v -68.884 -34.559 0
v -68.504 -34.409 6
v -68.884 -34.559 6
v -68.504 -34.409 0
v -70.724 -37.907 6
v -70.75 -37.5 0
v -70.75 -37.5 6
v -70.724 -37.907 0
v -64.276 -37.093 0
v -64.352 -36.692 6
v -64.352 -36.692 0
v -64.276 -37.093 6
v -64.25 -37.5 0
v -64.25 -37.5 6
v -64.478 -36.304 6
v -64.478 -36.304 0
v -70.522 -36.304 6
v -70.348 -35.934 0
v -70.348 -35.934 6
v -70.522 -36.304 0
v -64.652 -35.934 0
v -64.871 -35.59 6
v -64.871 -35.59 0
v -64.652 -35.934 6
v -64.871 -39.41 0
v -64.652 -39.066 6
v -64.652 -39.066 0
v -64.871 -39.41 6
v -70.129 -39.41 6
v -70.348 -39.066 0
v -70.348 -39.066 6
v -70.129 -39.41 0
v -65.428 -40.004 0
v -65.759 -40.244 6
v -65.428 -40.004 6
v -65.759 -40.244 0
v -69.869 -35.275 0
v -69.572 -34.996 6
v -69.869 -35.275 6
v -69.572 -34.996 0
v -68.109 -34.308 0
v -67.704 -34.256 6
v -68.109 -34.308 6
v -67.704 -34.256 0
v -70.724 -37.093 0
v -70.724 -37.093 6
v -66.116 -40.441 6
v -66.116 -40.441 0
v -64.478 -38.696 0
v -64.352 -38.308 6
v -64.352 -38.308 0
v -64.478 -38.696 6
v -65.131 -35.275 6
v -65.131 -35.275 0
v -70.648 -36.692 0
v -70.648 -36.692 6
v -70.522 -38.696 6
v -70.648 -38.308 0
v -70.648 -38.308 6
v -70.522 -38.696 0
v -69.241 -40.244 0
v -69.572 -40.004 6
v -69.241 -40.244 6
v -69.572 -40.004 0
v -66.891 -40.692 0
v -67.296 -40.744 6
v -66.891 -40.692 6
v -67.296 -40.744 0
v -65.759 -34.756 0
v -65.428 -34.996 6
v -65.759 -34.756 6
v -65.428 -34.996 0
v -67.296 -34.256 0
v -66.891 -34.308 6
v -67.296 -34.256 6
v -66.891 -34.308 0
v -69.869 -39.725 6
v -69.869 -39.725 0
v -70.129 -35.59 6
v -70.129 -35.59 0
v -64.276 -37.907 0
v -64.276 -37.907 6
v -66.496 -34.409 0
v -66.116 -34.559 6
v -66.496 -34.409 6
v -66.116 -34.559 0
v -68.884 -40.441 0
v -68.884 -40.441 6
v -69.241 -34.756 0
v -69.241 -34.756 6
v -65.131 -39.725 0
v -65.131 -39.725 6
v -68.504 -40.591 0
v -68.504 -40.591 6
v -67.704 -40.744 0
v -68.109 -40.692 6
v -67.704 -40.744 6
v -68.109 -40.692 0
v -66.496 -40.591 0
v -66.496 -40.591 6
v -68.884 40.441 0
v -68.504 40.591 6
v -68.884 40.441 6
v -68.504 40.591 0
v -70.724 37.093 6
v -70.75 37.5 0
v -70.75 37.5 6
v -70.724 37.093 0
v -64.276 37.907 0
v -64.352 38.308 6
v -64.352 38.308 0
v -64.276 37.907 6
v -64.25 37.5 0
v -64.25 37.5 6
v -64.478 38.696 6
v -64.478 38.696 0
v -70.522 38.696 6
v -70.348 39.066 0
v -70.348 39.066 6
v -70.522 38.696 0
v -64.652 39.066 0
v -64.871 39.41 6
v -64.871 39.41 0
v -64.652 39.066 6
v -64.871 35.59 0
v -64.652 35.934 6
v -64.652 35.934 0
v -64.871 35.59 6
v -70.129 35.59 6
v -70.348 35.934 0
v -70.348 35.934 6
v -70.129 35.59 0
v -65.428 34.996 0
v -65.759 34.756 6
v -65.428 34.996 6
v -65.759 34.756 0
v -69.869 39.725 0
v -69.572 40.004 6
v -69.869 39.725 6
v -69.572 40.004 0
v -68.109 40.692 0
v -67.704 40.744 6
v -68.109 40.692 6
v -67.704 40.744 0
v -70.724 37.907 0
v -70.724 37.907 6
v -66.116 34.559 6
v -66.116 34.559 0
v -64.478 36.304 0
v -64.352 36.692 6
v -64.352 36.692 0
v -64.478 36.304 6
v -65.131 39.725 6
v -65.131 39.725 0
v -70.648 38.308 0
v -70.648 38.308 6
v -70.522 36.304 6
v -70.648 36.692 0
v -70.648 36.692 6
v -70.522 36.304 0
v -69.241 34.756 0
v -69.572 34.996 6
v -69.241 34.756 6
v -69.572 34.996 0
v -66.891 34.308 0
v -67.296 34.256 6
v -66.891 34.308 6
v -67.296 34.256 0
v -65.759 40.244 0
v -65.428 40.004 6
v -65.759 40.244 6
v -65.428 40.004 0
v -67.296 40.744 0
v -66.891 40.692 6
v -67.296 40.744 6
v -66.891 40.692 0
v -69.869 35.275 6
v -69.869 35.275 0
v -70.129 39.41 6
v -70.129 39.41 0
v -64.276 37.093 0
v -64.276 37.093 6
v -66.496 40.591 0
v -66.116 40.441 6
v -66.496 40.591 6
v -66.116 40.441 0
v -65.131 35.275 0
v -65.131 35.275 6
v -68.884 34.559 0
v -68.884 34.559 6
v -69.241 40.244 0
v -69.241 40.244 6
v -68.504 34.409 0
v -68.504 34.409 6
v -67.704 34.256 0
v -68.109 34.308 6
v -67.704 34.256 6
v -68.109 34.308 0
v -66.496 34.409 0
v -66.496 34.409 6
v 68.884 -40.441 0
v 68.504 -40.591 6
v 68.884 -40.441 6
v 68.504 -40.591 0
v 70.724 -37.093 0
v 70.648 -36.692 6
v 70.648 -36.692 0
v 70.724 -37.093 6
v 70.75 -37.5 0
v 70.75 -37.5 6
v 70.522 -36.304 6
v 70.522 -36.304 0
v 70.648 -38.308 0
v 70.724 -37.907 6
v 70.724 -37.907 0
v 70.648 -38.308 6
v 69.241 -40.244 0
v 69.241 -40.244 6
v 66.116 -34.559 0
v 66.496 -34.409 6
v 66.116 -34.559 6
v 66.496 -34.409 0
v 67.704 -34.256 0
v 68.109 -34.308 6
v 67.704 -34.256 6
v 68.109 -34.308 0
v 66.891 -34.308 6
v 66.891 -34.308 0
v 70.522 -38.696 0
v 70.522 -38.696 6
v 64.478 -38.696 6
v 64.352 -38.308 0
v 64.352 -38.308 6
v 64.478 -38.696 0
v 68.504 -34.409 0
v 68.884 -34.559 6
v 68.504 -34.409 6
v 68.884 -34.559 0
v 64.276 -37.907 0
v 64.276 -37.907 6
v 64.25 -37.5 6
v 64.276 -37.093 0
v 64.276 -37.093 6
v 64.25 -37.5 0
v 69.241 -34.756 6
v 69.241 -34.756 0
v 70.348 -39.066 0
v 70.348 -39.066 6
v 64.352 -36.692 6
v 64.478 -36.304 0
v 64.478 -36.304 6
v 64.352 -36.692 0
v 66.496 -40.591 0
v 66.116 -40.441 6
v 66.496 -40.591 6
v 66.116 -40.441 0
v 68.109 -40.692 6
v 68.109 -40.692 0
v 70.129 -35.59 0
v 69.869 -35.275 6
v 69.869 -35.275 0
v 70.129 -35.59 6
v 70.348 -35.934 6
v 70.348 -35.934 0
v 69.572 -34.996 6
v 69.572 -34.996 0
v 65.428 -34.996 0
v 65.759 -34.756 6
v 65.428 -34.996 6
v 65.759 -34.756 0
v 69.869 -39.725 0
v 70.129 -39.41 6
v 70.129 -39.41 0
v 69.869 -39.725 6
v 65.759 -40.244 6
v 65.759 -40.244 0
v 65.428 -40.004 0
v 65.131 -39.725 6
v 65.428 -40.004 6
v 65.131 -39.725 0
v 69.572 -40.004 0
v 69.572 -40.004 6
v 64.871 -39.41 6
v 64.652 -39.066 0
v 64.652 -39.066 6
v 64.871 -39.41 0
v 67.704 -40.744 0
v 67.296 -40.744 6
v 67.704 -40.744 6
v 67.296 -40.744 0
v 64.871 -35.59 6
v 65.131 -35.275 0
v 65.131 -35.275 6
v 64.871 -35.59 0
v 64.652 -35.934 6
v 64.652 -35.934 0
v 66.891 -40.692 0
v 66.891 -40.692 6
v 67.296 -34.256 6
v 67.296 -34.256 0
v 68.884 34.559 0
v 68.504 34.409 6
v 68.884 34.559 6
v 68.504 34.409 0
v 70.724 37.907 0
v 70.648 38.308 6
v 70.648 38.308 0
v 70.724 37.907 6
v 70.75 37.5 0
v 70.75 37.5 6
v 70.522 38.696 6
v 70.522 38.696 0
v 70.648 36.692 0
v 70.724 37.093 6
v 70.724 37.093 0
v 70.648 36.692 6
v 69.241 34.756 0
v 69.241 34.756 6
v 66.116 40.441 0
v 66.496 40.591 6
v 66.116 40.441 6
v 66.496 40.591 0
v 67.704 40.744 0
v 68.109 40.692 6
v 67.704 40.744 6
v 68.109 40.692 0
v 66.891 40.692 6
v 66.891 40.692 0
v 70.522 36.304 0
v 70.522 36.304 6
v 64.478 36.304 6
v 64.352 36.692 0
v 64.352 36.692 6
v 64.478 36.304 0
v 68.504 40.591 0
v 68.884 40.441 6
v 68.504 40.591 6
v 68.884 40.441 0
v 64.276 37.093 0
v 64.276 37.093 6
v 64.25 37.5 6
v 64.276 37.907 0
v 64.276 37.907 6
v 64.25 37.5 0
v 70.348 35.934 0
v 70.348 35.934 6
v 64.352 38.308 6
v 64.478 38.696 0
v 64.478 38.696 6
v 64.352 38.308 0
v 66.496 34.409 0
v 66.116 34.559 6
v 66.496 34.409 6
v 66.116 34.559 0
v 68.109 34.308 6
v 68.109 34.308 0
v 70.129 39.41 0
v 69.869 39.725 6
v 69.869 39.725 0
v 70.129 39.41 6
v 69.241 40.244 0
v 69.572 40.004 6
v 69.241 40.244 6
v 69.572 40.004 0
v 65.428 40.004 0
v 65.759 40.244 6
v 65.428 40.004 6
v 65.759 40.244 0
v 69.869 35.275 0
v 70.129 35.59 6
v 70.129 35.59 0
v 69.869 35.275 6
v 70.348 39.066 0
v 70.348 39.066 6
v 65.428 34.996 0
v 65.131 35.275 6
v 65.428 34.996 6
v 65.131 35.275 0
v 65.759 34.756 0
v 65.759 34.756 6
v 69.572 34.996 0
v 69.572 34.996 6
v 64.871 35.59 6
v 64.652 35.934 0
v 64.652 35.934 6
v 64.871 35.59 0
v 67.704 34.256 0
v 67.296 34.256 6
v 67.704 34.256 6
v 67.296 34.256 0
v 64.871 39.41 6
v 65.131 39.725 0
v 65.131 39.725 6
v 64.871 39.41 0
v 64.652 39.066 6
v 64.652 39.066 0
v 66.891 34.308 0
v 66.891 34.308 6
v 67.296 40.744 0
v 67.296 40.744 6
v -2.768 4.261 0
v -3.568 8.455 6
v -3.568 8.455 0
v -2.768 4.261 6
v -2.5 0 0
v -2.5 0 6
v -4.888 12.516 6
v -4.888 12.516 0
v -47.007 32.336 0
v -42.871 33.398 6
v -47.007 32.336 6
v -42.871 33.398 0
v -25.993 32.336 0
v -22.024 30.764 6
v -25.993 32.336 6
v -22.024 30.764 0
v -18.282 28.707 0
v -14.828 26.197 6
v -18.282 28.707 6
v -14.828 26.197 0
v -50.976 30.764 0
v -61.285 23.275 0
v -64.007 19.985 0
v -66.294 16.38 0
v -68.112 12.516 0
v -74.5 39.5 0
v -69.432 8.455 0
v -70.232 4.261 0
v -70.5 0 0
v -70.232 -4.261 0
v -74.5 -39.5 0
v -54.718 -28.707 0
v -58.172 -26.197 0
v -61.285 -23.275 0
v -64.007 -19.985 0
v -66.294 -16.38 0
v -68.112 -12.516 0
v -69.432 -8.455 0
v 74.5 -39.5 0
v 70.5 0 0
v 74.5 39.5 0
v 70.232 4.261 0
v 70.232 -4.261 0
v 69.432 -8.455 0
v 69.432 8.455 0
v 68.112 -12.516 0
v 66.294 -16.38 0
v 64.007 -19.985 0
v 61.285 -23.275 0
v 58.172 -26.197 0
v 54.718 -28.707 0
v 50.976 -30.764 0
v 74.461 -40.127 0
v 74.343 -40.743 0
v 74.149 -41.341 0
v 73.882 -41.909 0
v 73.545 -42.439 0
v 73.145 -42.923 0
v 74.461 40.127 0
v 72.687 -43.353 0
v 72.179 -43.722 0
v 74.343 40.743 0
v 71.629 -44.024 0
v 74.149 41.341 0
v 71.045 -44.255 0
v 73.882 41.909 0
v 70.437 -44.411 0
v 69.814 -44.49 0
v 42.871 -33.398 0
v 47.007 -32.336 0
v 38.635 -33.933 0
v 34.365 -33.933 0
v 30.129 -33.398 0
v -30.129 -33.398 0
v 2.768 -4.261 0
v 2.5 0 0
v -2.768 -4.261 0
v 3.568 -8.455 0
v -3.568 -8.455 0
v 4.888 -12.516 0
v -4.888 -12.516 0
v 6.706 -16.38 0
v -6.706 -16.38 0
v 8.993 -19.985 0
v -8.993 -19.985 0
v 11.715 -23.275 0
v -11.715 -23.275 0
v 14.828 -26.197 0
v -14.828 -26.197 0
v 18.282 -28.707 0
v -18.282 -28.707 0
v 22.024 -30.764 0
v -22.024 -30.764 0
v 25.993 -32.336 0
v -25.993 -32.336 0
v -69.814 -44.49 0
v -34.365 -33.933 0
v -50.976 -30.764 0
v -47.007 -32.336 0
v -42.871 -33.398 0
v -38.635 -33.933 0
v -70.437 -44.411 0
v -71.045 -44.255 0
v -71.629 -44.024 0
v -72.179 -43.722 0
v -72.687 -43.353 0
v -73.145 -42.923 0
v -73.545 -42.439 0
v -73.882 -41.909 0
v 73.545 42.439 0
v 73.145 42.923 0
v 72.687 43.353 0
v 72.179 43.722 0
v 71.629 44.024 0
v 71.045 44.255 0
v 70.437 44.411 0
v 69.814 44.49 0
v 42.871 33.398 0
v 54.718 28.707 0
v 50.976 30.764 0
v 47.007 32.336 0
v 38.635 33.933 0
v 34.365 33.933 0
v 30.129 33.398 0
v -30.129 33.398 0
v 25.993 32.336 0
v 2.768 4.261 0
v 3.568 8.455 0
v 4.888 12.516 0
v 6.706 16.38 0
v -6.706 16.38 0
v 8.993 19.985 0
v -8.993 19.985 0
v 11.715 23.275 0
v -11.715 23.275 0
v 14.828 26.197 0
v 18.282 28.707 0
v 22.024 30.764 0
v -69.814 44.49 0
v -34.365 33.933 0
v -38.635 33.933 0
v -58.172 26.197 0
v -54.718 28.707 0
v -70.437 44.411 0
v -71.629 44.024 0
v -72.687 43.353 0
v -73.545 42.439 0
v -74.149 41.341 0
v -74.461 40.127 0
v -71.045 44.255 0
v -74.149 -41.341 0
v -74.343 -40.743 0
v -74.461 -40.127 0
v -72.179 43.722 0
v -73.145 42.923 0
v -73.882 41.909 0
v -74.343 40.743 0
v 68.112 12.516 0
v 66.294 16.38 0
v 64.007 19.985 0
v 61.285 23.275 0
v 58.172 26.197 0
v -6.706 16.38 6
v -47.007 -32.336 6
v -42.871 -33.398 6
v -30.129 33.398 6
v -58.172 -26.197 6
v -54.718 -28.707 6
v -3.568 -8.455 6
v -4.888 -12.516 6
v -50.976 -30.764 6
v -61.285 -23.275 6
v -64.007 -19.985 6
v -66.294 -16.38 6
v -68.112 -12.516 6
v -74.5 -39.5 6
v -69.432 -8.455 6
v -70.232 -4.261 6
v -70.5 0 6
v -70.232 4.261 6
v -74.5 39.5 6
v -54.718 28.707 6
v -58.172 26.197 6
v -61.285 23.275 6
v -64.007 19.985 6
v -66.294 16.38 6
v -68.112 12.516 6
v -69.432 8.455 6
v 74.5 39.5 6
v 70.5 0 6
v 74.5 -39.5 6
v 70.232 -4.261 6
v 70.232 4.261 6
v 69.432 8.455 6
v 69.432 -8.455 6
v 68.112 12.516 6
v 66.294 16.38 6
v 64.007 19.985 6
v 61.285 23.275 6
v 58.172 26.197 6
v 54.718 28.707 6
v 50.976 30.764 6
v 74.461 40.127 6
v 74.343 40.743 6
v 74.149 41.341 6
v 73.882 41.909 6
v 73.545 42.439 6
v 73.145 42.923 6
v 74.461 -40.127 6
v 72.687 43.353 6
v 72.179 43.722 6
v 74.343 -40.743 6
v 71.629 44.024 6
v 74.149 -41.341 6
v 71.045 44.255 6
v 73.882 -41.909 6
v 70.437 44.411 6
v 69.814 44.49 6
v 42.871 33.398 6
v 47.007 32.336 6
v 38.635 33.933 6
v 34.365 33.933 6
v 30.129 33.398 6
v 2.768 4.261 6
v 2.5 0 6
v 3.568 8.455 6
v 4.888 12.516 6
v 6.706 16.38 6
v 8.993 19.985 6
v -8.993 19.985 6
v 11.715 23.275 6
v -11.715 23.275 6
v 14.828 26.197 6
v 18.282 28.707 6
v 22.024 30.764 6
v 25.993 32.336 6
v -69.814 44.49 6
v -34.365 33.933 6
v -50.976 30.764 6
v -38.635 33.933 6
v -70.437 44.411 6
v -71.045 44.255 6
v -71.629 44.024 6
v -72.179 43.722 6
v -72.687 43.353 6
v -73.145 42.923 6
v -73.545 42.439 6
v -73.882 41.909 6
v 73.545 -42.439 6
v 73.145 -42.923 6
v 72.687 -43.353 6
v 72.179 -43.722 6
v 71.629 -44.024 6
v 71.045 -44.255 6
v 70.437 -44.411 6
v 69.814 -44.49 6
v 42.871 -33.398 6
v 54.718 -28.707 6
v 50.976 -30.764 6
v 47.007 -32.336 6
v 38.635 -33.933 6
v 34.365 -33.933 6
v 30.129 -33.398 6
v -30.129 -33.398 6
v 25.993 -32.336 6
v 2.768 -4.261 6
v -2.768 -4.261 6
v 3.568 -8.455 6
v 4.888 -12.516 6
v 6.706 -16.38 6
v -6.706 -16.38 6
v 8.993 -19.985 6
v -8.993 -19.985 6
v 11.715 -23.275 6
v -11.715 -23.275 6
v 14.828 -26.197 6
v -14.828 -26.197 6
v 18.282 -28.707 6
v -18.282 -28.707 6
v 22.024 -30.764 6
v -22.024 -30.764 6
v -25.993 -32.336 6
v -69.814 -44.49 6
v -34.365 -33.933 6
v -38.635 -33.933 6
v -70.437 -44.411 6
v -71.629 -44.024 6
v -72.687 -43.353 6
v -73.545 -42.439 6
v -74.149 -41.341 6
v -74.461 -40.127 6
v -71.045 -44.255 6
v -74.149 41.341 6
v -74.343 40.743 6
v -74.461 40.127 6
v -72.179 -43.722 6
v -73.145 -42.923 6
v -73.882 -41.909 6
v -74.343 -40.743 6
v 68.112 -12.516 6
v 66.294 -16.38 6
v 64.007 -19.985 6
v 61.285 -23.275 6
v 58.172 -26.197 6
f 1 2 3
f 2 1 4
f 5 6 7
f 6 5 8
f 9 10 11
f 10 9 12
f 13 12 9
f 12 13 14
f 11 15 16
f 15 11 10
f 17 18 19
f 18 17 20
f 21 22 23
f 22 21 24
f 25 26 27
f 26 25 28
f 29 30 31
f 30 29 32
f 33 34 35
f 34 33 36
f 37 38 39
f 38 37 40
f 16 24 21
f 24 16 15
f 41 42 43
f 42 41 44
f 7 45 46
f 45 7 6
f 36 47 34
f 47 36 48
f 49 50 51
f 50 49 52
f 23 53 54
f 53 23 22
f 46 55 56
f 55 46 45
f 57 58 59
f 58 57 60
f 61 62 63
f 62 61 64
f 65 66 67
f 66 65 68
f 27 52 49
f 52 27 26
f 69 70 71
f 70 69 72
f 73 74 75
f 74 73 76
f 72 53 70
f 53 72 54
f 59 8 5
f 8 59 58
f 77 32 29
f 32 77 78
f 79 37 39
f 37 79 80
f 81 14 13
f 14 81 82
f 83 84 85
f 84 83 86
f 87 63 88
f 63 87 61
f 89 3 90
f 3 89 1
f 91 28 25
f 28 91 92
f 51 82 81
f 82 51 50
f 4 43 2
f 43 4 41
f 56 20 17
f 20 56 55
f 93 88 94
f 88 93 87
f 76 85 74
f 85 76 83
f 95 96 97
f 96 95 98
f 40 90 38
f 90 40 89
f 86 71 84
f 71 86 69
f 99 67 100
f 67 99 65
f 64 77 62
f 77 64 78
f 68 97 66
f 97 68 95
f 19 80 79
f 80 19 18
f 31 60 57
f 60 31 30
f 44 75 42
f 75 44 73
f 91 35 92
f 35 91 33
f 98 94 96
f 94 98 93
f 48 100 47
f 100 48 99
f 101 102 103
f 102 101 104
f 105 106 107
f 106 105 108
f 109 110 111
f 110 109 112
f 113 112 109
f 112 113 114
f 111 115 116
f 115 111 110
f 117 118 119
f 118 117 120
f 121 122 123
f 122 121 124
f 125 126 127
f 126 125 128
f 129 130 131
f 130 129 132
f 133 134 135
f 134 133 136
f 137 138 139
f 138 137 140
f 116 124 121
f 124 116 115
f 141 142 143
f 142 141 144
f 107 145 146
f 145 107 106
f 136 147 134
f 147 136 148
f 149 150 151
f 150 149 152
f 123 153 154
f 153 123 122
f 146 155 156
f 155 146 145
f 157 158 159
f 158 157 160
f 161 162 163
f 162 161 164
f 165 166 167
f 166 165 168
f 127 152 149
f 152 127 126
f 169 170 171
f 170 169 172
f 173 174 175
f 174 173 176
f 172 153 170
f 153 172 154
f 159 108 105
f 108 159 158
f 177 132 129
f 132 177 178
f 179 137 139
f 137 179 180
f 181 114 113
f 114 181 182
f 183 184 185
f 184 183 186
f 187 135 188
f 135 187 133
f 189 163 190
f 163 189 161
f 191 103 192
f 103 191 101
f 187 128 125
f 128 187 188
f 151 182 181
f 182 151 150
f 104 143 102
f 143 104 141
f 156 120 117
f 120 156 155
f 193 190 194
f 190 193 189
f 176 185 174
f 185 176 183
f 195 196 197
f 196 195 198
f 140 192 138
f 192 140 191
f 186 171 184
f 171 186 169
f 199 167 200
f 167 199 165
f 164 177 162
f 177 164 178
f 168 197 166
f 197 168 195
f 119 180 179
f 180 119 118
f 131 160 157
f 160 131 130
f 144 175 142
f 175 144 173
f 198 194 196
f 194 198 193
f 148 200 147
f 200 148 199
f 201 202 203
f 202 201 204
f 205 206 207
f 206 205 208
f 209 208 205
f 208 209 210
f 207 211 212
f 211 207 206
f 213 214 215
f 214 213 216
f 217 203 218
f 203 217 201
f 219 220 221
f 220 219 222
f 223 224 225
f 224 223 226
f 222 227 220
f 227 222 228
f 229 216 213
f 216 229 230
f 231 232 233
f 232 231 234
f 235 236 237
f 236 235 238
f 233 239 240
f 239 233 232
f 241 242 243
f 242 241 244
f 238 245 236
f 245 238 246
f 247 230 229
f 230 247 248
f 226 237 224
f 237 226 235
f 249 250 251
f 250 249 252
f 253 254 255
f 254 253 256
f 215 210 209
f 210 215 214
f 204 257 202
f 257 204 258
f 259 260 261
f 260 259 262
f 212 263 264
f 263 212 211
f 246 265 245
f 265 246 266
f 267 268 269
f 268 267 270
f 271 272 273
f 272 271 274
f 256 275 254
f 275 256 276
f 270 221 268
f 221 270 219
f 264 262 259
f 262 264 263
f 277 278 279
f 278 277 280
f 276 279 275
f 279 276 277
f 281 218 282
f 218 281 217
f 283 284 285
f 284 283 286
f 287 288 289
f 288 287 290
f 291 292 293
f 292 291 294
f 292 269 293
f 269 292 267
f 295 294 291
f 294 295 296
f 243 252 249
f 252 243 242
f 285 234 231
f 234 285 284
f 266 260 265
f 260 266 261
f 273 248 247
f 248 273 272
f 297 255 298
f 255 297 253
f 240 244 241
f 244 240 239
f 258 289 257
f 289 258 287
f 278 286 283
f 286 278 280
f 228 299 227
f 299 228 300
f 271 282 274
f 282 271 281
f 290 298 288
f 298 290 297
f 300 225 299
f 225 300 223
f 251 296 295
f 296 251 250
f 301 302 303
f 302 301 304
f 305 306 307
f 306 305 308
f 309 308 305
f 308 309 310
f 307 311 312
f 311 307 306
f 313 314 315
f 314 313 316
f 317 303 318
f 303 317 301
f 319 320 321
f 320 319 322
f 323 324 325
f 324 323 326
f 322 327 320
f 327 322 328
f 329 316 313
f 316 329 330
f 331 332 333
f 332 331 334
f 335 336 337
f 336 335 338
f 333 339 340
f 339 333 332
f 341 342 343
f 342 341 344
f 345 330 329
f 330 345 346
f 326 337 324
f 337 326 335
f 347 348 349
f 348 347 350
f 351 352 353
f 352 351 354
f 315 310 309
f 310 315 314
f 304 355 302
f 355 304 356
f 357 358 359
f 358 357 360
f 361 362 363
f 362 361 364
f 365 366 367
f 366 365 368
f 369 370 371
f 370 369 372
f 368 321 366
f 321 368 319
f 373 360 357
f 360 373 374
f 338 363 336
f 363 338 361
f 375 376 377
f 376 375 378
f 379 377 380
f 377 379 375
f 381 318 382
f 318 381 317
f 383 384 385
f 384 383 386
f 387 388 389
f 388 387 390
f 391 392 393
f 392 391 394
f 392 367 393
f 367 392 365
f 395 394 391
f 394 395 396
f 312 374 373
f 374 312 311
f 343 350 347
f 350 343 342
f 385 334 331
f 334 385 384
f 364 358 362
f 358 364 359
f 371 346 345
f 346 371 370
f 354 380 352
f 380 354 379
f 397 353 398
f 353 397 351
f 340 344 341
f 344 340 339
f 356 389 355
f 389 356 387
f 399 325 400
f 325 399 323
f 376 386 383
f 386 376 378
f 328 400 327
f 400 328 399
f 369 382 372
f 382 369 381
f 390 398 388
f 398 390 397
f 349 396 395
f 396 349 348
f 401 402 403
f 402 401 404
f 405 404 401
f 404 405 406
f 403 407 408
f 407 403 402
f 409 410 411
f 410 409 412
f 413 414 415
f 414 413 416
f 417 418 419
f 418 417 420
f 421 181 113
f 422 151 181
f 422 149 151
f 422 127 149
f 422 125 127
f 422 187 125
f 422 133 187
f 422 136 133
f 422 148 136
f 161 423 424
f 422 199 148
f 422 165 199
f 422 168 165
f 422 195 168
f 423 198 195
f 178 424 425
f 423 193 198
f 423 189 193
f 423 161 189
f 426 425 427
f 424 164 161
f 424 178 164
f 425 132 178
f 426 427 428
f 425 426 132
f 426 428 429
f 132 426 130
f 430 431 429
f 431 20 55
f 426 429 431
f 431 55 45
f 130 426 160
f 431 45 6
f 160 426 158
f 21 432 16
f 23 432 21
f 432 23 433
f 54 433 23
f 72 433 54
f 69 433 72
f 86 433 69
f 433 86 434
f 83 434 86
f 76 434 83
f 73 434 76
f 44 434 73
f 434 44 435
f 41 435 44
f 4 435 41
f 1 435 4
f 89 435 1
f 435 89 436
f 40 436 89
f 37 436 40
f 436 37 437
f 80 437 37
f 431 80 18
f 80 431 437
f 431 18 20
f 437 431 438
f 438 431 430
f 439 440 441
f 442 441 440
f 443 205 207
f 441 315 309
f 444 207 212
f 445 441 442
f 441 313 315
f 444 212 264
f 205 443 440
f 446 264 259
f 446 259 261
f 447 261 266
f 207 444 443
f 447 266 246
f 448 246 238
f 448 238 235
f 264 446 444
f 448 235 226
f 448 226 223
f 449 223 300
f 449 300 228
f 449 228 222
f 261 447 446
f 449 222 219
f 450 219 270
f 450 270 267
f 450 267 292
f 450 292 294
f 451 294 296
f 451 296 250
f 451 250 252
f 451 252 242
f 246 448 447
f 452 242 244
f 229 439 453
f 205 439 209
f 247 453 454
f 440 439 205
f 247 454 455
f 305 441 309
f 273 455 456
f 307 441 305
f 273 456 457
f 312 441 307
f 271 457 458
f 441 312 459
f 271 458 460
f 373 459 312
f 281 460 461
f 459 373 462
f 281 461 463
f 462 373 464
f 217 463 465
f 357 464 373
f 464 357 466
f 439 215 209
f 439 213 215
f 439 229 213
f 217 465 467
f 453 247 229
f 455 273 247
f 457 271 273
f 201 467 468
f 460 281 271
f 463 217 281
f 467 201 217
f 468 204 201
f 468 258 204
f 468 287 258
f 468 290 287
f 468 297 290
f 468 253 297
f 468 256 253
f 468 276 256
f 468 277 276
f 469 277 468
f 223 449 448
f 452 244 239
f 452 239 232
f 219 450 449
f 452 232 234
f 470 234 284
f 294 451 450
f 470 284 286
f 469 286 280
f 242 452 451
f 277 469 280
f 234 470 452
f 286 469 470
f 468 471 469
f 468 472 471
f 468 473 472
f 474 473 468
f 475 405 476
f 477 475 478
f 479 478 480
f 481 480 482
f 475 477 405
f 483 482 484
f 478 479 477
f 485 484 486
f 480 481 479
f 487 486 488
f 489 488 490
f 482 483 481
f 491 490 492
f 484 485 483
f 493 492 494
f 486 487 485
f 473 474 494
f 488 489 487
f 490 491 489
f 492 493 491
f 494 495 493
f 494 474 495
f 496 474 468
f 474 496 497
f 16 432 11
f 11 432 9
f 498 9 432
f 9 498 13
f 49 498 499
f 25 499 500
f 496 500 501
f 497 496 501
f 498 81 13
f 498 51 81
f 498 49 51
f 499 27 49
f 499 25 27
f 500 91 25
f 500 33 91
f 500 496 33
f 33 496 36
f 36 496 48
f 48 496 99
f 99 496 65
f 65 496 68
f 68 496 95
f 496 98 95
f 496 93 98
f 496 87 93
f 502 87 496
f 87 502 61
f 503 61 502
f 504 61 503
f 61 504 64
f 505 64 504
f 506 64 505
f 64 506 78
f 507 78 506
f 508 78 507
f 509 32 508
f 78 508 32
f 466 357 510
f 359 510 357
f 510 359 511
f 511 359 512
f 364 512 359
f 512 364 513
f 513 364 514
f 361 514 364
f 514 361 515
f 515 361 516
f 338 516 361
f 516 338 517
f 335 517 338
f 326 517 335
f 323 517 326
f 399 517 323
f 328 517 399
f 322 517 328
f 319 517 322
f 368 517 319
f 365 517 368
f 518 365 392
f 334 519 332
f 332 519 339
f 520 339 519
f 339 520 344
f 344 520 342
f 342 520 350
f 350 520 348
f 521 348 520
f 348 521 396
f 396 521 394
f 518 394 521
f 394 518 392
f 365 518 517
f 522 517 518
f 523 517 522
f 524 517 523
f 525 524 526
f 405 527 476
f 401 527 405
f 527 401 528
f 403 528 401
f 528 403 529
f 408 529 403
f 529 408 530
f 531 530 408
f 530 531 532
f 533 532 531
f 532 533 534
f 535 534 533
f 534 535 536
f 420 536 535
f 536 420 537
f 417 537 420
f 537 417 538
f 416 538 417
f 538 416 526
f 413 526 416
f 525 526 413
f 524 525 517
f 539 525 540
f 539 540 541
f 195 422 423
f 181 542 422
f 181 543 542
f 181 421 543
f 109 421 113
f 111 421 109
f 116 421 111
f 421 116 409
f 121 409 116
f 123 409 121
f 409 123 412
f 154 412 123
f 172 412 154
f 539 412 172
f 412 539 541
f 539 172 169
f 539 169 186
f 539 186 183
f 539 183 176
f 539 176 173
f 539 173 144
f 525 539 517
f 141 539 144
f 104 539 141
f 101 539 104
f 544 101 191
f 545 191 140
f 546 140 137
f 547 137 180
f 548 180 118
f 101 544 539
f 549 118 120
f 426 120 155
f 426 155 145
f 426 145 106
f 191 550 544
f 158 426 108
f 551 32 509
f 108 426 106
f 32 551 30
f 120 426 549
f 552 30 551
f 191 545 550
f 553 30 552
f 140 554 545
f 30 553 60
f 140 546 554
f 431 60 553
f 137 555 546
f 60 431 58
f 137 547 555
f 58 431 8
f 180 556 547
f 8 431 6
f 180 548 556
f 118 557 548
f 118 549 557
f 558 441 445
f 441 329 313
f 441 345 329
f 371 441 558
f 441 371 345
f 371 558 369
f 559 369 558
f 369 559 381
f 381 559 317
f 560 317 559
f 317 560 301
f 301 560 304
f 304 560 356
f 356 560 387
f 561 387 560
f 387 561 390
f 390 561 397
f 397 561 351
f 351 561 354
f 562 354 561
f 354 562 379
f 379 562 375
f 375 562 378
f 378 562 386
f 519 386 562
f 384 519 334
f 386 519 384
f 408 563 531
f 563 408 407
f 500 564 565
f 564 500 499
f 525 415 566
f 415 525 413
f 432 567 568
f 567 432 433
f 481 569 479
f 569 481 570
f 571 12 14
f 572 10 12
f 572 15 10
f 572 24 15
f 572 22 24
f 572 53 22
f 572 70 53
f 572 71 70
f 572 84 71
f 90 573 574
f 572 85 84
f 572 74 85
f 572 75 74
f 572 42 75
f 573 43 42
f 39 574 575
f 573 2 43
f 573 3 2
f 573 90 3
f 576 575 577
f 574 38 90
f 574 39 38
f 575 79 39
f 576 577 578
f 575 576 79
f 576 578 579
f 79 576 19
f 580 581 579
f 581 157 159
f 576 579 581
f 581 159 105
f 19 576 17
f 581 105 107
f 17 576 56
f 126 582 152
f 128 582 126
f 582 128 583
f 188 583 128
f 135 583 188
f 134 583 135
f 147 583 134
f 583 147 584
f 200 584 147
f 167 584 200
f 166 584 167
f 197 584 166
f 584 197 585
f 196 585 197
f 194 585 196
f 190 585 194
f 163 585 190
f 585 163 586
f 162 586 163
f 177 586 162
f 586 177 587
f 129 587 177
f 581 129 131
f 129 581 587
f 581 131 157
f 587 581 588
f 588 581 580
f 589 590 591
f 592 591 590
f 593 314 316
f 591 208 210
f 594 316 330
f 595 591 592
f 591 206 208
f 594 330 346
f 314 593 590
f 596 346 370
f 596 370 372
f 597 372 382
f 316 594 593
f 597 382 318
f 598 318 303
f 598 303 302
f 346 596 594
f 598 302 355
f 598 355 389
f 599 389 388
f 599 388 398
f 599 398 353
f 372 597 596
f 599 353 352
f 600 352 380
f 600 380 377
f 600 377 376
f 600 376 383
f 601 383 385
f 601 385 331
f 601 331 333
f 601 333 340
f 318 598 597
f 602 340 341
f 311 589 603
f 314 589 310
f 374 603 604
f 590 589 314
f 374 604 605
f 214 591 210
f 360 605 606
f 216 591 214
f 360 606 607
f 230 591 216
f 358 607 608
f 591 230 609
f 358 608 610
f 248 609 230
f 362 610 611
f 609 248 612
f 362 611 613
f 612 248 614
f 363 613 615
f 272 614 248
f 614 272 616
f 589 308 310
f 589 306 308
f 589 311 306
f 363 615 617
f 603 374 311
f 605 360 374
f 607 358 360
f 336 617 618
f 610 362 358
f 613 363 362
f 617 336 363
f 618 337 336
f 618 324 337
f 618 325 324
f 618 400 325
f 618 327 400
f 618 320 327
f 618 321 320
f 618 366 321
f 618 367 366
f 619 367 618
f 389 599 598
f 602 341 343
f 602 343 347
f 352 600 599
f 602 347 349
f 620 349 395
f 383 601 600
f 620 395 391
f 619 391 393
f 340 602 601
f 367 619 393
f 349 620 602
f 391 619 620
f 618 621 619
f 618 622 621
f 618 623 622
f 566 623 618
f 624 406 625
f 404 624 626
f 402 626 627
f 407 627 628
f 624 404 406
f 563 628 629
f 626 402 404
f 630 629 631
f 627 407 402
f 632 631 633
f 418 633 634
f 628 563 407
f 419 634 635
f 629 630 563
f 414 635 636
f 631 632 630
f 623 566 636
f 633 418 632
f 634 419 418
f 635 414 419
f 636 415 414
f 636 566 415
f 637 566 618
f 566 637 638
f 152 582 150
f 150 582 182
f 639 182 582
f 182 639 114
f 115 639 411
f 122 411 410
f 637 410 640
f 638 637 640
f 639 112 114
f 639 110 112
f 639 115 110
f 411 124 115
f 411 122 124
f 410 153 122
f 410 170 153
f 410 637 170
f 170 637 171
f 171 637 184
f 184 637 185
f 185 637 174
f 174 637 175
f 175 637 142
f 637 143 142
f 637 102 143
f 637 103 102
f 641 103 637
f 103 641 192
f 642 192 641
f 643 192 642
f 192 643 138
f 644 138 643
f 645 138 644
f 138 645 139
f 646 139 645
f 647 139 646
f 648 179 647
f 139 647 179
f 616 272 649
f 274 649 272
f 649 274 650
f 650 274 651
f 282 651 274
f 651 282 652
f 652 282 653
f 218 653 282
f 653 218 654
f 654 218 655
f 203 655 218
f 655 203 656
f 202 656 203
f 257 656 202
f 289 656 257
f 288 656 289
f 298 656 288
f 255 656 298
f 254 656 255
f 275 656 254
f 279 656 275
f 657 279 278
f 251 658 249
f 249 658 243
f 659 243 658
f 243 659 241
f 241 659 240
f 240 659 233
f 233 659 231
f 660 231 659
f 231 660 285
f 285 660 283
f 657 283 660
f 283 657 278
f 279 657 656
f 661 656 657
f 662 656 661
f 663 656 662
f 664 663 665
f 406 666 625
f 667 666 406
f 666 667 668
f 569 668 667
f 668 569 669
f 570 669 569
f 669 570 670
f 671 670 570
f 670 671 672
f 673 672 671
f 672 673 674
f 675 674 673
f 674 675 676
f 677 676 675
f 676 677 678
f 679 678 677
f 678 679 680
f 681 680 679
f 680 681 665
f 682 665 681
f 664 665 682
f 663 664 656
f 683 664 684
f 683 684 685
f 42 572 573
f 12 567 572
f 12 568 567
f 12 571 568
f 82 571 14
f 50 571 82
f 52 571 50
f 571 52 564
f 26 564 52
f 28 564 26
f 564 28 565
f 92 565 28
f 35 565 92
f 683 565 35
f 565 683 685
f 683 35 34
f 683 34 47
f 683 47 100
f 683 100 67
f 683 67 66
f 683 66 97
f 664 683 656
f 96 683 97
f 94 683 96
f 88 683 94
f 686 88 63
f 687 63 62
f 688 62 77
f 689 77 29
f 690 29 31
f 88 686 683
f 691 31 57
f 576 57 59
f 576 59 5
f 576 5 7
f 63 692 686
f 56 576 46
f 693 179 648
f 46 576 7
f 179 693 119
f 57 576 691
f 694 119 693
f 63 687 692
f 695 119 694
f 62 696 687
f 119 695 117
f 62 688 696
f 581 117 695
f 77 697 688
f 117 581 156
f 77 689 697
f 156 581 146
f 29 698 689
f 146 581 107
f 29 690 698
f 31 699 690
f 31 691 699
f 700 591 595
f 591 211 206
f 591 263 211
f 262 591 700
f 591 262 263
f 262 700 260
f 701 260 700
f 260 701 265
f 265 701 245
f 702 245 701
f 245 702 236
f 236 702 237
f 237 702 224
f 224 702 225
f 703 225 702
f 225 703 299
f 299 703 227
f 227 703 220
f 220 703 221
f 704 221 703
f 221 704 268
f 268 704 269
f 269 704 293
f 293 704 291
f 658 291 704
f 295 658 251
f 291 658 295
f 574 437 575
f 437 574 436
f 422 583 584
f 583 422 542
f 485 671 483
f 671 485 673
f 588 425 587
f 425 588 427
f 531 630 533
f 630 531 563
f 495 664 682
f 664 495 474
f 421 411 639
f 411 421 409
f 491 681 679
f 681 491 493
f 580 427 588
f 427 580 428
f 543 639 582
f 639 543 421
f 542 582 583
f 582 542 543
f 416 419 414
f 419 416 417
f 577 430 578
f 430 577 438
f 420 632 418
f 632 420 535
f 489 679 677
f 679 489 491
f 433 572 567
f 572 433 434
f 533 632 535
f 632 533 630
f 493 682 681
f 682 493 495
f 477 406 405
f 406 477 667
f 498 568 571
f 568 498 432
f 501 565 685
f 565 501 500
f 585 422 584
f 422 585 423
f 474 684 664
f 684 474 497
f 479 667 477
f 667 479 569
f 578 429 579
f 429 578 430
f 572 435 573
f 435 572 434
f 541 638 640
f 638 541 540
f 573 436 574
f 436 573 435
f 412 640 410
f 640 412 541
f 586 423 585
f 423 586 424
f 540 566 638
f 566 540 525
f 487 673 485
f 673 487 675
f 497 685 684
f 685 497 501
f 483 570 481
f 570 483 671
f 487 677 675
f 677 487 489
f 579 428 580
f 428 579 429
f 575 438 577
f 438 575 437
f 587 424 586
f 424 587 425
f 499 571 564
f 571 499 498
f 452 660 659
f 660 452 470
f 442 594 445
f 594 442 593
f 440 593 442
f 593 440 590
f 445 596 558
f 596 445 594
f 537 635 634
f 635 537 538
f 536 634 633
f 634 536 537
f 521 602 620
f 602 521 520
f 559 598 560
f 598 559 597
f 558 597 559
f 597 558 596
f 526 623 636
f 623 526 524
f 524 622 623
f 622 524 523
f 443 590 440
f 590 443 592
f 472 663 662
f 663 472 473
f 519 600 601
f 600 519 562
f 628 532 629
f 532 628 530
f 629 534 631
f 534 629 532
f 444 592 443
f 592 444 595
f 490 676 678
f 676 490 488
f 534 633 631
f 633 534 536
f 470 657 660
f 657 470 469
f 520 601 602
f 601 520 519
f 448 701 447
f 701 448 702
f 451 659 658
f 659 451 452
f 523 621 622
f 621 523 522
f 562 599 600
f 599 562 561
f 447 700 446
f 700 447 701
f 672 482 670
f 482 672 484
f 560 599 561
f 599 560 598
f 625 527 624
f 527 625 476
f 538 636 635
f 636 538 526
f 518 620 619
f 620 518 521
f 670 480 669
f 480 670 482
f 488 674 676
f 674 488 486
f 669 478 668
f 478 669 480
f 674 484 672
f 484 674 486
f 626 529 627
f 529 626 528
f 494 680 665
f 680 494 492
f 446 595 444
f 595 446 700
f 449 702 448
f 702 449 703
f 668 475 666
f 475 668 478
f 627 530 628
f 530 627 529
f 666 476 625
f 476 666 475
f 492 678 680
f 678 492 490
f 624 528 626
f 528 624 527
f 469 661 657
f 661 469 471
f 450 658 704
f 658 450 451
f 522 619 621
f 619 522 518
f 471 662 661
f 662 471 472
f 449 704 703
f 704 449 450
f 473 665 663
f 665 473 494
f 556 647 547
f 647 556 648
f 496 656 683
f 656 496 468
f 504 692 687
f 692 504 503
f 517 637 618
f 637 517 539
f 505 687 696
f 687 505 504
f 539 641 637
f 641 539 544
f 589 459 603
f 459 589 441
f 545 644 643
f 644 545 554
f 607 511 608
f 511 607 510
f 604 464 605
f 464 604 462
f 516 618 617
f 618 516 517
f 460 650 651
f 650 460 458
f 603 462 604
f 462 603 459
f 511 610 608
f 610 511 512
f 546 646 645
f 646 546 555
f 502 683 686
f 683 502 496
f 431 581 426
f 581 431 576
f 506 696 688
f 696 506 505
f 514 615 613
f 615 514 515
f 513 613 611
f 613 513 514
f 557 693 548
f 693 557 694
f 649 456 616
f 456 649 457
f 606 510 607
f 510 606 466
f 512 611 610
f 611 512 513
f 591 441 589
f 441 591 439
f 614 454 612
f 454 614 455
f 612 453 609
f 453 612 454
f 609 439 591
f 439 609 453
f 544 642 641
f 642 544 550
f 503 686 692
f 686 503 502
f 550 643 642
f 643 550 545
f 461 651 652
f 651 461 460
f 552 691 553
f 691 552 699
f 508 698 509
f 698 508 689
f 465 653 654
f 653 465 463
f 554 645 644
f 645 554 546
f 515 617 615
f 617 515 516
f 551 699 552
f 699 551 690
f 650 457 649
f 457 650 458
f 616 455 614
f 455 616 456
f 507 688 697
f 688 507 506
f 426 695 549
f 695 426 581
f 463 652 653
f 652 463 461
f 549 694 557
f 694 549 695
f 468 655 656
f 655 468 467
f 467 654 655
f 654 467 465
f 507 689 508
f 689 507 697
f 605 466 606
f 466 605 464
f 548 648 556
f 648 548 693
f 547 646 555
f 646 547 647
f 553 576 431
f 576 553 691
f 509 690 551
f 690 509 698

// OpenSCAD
$fn = 50;


difference() {
	union() {
		hull() {
			translate(v = [-69.5000000000, 39.5000000000, 0]) {
				cylinder(h = 6, r = 5);
			}
			translate(v = [69.5000000000, 39.5000000000, 0]) {
				cylinder(h = 6, r = 5);
			}
			translate(v = [-69.5000000000, -39.5000000000, 0]) {
				cylinder(h = 6, r = 5);
			}
			translate(v = [69.5000000000, -39.5000000000, 0]) {
				cylinder(h = 6, r = 5);
			}
		}
	}
	union() {
		#translate(v = [-67.5000000000, -37.5000000000, -100.0000000000]) {
			cylinder(h = 200, r = 3.2500000000);
		}
		#translate(v = [-67.5000000000, 37.5000000000, -100.0000000000]) {
			cylinder(h = 200, r = 3.2500000000);
		}
		#translate(v = [67.5000000000, -37.5000000000, -100.0000000000]) {
			cylinder(h = 200, r = 3.2500000000);
		}
		#translate(v = [67.5000000000, 37.5000000000, -100.0000000000]) {
			cylinder(h = 200, r = 3.2500000000);
		}
		#translate(v = [-36.5000000000, 0, 0]) {
			cylinder(h = 6, r = 34.0000000000);
		}
		#translate(v = [36.5000000000, 0, 0]) {
			cylinder(h = 6, r = 34.0000000000);
		}
	}
}
